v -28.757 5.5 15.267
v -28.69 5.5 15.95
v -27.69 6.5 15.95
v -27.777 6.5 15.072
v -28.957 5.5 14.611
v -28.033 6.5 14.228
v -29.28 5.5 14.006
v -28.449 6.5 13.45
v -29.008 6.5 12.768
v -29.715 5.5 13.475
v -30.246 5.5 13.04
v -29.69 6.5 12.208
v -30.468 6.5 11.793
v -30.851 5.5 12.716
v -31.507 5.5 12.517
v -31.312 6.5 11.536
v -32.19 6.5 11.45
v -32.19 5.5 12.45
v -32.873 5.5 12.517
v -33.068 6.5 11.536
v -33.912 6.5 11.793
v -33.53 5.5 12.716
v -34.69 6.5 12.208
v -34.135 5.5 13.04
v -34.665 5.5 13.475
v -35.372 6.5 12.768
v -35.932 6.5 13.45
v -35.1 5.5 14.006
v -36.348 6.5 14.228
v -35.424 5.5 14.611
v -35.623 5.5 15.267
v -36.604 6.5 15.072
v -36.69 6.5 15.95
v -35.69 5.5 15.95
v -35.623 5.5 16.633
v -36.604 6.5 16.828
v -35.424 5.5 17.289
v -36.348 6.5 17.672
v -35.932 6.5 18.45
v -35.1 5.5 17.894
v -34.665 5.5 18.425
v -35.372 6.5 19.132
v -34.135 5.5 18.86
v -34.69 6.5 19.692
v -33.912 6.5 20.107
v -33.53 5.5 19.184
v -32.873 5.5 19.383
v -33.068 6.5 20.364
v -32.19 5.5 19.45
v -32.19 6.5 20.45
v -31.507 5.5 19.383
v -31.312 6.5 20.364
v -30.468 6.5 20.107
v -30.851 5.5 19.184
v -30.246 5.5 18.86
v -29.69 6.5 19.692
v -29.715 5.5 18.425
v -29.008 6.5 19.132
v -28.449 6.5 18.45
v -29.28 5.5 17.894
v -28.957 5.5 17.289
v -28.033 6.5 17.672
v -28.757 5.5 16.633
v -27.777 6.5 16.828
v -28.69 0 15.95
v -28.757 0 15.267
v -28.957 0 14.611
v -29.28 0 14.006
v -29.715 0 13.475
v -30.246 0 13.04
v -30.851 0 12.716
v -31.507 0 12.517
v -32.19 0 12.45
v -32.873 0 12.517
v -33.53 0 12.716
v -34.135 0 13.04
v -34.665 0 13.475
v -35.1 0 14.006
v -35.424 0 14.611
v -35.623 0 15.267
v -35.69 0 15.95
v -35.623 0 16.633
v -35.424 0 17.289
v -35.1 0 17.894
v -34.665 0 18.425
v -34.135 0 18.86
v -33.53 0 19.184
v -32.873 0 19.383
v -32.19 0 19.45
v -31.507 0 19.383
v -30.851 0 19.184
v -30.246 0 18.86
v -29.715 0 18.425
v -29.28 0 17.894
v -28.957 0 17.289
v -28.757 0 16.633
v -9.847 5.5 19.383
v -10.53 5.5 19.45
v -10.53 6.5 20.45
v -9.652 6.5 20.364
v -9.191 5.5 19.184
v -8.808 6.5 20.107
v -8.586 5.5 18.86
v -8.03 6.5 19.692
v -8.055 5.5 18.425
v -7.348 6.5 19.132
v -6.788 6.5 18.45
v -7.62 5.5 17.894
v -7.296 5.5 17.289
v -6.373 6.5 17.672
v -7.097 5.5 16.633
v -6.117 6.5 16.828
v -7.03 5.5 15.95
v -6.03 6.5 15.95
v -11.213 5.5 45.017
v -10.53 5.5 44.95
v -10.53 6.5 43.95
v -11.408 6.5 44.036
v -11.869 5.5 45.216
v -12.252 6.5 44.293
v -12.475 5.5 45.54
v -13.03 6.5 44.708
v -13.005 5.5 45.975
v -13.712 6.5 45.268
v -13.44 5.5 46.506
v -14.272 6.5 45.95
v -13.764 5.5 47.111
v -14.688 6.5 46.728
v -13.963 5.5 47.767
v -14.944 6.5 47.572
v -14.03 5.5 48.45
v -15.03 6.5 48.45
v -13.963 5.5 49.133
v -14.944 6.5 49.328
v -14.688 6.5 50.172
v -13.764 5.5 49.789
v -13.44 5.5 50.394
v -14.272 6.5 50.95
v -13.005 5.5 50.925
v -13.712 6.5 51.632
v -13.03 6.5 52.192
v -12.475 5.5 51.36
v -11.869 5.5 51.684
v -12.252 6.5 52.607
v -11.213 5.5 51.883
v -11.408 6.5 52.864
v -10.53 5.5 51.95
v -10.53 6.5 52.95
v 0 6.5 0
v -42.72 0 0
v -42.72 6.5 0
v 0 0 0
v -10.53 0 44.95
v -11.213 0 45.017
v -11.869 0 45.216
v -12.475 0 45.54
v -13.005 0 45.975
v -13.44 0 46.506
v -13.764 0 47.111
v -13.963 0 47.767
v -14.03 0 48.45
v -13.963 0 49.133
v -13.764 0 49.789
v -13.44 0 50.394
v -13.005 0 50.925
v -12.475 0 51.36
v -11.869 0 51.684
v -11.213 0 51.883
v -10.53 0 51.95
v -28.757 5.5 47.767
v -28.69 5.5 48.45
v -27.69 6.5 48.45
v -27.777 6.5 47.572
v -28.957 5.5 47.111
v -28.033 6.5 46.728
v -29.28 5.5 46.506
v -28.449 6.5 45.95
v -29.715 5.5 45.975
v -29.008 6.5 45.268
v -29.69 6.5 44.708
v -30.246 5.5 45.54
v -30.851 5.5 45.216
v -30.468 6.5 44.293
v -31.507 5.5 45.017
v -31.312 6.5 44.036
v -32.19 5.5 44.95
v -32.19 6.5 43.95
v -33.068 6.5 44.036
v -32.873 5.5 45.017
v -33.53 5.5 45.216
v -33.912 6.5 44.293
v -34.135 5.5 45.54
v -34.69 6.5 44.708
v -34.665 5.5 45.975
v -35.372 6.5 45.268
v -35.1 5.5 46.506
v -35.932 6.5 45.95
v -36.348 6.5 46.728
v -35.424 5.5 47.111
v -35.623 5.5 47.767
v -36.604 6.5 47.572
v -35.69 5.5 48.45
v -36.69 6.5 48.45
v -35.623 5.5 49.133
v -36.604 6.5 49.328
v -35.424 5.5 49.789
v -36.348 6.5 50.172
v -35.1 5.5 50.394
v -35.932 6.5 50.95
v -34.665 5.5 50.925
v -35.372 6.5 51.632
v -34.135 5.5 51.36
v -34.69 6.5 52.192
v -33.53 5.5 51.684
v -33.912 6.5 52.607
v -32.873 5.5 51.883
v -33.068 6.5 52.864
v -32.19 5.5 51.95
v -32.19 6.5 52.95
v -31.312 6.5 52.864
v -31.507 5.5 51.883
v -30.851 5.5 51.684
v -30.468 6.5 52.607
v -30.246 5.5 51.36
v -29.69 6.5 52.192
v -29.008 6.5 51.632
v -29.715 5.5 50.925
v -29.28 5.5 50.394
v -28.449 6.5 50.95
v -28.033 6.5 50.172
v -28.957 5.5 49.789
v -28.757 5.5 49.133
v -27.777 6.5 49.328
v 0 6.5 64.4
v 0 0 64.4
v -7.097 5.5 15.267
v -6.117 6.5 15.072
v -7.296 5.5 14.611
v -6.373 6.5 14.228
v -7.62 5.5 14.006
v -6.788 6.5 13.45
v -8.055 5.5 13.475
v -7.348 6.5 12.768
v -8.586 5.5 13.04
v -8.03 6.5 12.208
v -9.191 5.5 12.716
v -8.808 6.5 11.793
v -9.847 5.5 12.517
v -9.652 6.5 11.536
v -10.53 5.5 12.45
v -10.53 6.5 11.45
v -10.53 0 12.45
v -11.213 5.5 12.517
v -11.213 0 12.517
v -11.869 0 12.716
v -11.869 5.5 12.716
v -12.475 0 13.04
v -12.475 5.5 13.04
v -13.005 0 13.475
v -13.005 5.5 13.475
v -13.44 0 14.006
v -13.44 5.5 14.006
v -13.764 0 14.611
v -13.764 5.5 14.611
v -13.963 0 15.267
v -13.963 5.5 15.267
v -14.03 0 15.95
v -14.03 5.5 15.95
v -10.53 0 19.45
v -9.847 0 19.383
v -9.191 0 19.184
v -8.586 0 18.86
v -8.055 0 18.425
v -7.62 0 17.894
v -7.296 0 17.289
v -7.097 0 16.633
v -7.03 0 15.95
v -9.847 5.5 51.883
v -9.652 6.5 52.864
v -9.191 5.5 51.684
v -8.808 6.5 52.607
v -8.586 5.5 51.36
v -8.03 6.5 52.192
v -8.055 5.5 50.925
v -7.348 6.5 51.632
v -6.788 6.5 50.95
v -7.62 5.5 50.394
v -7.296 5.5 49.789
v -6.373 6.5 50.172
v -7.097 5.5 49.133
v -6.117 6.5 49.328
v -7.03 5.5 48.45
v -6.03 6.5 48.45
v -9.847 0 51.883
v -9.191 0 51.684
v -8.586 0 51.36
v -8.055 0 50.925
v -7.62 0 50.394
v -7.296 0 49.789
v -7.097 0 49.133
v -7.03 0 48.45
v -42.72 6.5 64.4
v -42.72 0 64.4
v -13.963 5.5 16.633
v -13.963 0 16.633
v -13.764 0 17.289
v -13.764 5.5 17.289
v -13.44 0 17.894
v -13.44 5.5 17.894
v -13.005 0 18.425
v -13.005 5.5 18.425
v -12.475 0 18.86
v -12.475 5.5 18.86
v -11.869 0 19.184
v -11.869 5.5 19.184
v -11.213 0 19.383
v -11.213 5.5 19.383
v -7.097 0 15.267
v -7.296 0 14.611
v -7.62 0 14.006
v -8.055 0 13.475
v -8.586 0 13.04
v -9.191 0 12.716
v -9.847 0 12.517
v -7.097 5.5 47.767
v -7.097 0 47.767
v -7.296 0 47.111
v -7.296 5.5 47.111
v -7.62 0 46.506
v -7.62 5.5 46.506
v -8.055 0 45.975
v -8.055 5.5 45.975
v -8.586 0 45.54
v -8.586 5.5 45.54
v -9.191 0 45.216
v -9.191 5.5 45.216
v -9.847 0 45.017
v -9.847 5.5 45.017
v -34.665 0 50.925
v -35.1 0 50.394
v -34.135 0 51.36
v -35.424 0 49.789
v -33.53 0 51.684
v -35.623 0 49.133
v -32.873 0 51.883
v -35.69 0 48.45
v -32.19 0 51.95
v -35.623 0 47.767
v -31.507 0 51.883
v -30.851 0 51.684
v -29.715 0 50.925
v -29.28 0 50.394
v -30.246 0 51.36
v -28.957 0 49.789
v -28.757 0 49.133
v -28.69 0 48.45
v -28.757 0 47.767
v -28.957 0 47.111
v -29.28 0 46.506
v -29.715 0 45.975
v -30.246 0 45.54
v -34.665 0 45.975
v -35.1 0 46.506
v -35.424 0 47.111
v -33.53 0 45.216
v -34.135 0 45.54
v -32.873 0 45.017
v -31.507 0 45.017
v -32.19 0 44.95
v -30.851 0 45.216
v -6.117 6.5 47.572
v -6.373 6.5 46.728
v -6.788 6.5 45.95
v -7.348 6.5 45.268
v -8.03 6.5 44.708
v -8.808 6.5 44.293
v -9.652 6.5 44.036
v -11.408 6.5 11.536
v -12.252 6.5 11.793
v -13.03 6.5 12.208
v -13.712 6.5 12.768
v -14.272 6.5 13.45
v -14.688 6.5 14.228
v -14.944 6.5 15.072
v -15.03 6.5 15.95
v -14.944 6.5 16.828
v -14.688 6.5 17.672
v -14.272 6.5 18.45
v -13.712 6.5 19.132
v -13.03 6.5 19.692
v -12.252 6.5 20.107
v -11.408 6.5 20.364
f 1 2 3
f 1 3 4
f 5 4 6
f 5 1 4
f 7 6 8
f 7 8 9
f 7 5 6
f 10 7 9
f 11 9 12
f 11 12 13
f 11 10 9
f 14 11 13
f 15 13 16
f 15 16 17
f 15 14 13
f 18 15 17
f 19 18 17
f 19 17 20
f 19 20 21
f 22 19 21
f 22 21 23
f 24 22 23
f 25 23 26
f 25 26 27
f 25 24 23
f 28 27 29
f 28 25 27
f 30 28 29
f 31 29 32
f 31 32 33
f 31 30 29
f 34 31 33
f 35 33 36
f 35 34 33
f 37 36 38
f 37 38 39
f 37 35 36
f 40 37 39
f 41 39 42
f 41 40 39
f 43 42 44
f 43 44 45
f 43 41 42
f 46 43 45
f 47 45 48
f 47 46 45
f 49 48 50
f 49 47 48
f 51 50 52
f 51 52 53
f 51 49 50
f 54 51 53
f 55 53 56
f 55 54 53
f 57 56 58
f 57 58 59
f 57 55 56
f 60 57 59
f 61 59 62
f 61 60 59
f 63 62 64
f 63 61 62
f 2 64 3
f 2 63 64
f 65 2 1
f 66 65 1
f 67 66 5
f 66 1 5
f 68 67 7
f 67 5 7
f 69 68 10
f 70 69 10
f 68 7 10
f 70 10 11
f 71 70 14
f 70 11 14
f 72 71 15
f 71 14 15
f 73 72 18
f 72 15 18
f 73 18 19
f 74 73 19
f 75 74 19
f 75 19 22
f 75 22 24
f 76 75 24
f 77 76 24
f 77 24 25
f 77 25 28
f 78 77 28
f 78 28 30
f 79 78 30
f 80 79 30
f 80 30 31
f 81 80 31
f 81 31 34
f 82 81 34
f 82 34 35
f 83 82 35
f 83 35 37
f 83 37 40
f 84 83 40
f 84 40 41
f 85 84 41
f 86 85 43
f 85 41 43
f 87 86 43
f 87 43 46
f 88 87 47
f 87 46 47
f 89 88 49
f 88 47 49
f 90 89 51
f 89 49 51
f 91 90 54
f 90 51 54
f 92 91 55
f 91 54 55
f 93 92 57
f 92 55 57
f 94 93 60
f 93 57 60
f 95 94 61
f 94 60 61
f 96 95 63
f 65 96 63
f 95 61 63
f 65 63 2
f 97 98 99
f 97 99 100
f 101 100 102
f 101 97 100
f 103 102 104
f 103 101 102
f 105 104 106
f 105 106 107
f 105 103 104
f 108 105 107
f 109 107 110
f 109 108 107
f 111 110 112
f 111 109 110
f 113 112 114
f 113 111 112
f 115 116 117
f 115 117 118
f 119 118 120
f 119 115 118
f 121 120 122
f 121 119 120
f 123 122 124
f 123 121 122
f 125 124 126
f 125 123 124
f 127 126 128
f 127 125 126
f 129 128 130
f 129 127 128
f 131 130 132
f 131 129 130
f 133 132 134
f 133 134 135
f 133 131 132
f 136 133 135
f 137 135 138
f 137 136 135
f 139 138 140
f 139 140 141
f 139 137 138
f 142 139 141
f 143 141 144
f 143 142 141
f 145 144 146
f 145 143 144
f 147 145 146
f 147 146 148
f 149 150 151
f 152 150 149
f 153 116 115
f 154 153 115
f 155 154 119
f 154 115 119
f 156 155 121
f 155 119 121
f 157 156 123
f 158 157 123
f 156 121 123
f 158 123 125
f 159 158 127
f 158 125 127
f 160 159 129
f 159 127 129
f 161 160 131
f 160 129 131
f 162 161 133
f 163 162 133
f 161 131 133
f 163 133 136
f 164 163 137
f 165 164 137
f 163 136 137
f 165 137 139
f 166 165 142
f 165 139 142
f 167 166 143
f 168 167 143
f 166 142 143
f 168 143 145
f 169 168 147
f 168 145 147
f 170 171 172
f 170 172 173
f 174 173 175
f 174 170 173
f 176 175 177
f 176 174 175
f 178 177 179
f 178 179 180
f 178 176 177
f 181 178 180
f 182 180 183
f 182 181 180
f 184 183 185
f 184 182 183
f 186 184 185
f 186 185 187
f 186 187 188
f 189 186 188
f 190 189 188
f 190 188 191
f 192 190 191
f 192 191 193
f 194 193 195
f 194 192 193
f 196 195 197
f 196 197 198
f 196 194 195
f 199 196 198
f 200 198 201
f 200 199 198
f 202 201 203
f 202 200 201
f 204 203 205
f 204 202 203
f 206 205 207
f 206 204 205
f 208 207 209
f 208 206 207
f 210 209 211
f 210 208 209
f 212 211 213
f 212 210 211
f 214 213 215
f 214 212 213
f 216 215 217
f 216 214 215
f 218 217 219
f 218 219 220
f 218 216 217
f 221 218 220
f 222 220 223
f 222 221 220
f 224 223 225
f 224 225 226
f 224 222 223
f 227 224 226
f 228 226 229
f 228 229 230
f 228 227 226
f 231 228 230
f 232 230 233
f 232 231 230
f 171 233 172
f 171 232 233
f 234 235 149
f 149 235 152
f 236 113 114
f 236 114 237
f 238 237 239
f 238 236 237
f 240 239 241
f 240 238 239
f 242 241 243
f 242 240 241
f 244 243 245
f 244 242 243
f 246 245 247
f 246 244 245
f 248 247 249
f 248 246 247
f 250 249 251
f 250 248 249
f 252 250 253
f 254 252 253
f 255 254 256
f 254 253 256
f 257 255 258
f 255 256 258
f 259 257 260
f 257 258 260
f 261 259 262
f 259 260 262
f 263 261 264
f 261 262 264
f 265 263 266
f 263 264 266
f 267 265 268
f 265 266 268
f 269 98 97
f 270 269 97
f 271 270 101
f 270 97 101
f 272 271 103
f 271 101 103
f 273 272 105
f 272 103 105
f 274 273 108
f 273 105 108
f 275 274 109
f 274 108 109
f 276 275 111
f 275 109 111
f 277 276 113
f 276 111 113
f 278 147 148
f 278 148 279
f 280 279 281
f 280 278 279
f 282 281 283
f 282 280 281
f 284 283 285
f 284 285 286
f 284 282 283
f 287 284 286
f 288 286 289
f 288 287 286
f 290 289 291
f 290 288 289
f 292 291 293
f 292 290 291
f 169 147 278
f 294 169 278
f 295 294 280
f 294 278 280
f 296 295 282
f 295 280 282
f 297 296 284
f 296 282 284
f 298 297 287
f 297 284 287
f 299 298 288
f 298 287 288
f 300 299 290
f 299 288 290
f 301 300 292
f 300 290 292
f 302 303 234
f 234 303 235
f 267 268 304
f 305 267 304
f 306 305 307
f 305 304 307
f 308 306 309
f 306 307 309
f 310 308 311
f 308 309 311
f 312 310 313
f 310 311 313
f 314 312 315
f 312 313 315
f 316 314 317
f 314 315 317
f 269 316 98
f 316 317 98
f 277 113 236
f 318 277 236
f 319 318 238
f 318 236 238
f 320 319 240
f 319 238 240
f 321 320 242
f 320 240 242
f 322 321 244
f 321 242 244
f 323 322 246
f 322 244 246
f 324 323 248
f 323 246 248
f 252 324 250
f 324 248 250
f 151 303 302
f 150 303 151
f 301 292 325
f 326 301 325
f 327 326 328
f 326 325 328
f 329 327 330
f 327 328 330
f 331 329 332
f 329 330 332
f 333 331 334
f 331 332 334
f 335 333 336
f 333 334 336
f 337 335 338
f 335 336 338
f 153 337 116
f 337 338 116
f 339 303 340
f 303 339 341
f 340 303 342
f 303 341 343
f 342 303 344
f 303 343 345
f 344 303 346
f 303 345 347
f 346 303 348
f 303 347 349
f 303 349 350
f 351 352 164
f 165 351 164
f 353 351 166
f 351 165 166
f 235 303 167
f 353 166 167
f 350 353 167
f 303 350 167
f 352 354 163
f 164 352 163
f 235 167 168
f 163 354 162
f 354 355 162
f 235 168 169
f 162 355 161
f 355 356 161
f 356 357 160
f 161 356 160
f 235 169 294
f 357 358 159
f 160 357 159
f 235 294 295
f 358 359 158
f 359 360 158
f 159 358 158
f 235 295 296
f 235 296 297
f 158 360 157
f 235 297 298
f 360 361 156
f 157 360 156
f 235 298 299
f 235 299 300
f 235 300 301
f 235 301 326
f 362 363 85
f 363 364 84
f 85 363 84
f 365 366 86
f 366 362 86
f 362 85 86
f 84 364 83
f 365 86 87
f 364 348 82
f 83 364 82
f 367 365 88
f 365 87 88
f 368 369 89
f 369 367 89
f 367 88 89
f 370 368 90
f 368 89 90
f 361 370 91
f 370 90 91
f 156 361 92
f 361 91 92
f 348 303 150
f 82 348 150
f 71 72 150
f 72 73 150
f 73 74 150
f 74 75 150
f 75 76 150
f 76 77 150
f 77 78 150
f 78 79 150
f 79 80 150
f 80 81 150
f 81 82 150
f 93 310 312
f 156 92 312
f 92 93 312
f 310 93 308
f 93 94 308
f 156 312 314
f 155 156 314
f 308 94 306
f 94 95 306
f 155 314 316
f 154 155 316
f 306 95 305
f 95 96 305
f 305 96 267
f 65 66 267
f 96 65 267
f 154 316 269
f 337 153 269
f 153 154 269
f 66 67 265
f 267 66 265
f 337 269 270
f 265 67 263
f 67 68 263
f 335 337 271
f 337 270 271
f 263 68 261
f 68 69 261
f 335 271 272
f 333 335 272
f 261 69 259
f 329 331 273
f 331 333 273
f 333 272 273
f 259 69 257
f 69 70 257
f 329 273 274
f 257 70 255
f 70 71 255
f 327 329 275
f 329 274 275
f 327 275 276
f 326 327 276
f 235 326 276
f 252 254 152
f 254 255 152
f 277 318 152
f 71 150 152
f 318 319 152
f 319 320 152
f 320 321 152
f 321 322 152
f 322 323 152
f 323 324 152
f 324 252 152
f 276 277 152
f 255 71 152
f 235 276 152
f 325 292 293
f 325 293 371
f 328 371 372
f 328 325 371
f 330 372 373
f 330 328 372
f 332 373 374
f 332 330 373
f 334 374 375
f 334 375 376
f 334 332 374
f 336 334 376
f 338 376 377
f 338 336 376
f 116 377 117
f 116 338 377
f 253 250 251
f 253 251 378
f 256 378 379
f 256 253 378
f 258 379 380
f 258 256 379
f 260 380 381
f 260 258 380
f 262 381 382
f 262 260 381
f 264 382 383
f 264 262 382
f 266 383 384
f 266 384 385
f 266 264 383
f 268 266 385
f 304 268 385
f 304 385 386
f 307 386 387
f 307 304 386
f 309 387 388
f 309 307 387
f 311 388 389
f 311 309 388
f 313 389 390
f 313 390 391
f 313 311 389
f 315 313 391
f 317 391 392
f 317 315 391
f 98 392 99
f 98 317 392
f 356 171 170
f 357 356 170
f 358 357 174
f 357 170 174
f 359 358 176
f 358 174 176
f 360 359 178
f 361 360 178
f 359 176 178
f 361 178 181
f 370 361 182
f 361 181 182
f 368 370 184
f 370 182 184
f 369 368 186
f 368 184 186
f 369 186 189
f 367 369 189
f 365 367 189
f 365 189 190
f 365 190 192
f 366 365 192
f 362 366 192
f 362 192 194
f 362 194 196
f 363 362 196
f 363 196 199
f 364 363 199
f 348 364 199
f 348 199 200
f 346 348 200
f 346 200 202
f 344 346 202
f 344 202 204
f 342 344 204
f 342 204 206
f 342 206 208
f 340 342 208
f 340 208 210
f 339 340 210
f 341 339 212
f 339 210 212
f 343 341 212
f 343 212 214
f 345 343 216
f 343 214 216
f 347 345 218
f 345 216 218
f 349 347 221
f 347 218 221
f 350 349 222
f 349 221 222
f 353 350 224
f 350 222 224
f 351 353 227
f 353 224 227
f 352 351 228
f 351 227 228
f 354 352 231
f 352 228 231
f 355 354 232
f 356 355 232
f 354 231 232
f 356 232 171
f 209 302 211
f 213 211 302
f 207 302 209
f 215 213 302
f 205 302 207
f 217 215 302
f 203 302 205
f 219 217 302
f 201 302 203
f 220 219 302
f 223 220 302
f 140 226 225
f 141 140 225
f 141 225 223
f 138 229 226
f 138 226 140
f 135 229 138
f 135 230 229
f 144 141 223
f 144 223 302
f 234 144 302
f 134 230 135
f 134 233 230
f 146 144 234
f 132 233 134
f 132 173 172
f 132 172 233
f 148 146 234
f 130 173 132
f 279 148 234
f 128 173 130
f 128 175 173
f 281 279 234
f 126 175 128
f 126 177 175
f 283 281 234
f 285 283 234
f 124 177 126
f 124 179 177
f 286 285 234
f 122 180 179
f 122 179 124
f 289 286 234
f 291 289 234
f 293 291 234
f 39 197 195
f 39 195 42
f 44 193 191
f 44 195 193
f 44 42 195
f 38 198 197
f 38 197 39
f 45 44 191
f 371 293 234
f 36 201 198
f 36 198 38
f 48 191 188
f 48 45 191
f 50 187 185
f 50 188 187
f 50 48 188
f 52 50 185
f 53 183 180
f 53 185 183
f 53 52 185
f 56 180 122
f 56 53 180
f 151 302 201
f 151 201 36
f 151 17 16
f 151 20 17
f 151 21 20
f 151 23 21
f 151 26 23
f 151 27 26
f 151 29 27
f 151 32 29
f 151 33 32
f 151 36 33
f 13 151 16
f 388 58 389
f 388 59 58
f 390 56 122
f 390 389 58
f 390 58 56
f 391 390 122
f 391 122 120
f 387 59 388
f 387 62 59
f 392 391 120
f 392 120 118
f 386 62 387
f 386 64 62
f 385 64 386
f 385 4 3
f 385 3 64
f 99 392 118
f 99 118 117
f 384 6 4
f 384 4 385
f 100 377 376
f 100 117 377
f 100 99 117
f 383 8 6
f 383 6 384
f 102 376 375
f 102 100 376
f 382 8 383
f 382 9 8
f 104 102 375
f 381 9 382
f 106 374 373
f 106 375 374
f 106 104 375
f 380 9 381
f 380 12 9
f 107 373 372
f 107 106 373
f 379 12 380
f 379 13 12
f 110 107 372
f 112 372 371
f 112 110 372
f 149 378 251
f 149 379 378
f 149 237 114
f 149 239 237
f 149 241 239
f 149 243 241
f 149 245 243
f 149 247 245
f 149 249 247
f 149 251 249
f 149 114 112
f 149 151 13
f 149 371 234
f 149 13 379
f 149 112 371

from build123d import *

# Parameters (mm, degrees)
SKETCH1_W           = 42.7202667
SKETCH1_H           = 64.4
BOSS_EXTRUDE1_DEPTH = 6.5
SKETCH2_R           = 3.5
CUT_EXTRUDE1_DEPTH  = 7.5
CHAMFER1_SIZE       = 1


with BuildPart() as part:
    # Sketch1 → Boss-Extrude1 (new body)
    with BuildSketch(Plane(origin=(0, 0, 0), x_dir=(1, 0, 0), z_dir=(0, 1, 0))):
        with Locations((-21.36013335, -32.2)):
            Rectangle(SKETCH1_W, SKETCH1_H)
    extrude(amount=BOSS_EXTRUDE1_DEPTH)

    # Sketch2 → Cut-Extrude1 (cut, through all)
    with BuildSketch(Plane(origin=(0, 6.5, 0), x_dir=(1, 0, 0), z_dir=(0, 1, 0))):
        with BuildLine():
            ThreePointArc((-35.690200025, -15.95), (-32.190200025, -19.45), (-28.690200025, -15.95))
            Line((-28.690200025, -15.95), (-35.690200025, -15.95))
        make_face()
        with BuildLine():
            Line((-35.690200025, -15.95), (-28.690200025, -15.95))
            ThreePointArc((-28.690200025, -15.95), (-32.190200025, -12.45), (-35.690200025, -15.95))
        make_face()
        with BuildLine():
            ThreePointArc((-7.030066675, -15.95), (-8.055192941, -13.475126266), (-10.530066675, -12.45))
            Line((-10.530066675, -12.45), (-10.530066675, -15.95))
            Line((-10.530066675, -15.95), (-7.030066675, -15.95))
        make_face()
        with BuildLine():
            Line((-10.530066675, -15.95), (-10.530066675, -12.45))
            ThreePointArc((-10.530066675, -12.45), (-13.004940409, -13.475126266), (-14.030066675, -15.95))
            Line((-14.030066675, -15.95), (-10.530066675, -15.95))
        make_face()
        with BuildLine():
            Line((-7.030066675, -15.95), (-10.530066675, -15.95))
            Line((-10.530066675, -15.95), (-10.530066675, -19.45))
            ThreePointArc((-10.530066675, -19.45), (-8.055192941, -18.424873734), (-7.030066675, -15.95))
        make_face()
        with BuildLine():
            Line((-10.530066675, -19.45), (-10.530066675, -15.95))
            Line((-10.530066675, -15.95), (-14.030066675, -15.95))
            ThreePointArc((-14.030066675, -15.95), (-13.004940409, -18.424873734), (-10.530066675, -19.45))
        make_face()
        with Locations((-32.190200025, -48.45)):
            Circle(SKETCH2_R)
        with BuildLine():
            ThreePointArc((-7.030066675, -48.45), (-8.055192941, -45.975126266), (-10.530066675, -44.95))
            Line((-10.530066675, -44.95), (-10.530066675, -51.95))
            ThreePointArc((-10.530066675, -51.95), (-8.055192941, -50.924873734), (-7.030066675, -48.45))
        make_face()
        with BuildLine():
            Line((-10.530066675, -51.95), (-10.530066675, -44.95))
            ThreePointArc((-10.530066675, -44.95), (-14.030066675, -48.45), (-10.530066675, -51.95))
        make_face()
    extrude(amount=-CUT_EXTRUDE1_DEPTH, mode=Mode.SUBTRACT)

    # Chamfer1
    chamfer1_edges = [part.edges().sort_by_distance(p)[0] for p in [
        (-10.530066675, 6.5, 44.95),
        (-35.690200025, 6.5, 48.45),
        (-28.690200025, 6.5, 15.95),
        (-10.530066675, 6.5, 12.45),
    ]]
    chamfer(chamfer1_edges, length=CHAMFER1_SIZE)


solid = part.part
